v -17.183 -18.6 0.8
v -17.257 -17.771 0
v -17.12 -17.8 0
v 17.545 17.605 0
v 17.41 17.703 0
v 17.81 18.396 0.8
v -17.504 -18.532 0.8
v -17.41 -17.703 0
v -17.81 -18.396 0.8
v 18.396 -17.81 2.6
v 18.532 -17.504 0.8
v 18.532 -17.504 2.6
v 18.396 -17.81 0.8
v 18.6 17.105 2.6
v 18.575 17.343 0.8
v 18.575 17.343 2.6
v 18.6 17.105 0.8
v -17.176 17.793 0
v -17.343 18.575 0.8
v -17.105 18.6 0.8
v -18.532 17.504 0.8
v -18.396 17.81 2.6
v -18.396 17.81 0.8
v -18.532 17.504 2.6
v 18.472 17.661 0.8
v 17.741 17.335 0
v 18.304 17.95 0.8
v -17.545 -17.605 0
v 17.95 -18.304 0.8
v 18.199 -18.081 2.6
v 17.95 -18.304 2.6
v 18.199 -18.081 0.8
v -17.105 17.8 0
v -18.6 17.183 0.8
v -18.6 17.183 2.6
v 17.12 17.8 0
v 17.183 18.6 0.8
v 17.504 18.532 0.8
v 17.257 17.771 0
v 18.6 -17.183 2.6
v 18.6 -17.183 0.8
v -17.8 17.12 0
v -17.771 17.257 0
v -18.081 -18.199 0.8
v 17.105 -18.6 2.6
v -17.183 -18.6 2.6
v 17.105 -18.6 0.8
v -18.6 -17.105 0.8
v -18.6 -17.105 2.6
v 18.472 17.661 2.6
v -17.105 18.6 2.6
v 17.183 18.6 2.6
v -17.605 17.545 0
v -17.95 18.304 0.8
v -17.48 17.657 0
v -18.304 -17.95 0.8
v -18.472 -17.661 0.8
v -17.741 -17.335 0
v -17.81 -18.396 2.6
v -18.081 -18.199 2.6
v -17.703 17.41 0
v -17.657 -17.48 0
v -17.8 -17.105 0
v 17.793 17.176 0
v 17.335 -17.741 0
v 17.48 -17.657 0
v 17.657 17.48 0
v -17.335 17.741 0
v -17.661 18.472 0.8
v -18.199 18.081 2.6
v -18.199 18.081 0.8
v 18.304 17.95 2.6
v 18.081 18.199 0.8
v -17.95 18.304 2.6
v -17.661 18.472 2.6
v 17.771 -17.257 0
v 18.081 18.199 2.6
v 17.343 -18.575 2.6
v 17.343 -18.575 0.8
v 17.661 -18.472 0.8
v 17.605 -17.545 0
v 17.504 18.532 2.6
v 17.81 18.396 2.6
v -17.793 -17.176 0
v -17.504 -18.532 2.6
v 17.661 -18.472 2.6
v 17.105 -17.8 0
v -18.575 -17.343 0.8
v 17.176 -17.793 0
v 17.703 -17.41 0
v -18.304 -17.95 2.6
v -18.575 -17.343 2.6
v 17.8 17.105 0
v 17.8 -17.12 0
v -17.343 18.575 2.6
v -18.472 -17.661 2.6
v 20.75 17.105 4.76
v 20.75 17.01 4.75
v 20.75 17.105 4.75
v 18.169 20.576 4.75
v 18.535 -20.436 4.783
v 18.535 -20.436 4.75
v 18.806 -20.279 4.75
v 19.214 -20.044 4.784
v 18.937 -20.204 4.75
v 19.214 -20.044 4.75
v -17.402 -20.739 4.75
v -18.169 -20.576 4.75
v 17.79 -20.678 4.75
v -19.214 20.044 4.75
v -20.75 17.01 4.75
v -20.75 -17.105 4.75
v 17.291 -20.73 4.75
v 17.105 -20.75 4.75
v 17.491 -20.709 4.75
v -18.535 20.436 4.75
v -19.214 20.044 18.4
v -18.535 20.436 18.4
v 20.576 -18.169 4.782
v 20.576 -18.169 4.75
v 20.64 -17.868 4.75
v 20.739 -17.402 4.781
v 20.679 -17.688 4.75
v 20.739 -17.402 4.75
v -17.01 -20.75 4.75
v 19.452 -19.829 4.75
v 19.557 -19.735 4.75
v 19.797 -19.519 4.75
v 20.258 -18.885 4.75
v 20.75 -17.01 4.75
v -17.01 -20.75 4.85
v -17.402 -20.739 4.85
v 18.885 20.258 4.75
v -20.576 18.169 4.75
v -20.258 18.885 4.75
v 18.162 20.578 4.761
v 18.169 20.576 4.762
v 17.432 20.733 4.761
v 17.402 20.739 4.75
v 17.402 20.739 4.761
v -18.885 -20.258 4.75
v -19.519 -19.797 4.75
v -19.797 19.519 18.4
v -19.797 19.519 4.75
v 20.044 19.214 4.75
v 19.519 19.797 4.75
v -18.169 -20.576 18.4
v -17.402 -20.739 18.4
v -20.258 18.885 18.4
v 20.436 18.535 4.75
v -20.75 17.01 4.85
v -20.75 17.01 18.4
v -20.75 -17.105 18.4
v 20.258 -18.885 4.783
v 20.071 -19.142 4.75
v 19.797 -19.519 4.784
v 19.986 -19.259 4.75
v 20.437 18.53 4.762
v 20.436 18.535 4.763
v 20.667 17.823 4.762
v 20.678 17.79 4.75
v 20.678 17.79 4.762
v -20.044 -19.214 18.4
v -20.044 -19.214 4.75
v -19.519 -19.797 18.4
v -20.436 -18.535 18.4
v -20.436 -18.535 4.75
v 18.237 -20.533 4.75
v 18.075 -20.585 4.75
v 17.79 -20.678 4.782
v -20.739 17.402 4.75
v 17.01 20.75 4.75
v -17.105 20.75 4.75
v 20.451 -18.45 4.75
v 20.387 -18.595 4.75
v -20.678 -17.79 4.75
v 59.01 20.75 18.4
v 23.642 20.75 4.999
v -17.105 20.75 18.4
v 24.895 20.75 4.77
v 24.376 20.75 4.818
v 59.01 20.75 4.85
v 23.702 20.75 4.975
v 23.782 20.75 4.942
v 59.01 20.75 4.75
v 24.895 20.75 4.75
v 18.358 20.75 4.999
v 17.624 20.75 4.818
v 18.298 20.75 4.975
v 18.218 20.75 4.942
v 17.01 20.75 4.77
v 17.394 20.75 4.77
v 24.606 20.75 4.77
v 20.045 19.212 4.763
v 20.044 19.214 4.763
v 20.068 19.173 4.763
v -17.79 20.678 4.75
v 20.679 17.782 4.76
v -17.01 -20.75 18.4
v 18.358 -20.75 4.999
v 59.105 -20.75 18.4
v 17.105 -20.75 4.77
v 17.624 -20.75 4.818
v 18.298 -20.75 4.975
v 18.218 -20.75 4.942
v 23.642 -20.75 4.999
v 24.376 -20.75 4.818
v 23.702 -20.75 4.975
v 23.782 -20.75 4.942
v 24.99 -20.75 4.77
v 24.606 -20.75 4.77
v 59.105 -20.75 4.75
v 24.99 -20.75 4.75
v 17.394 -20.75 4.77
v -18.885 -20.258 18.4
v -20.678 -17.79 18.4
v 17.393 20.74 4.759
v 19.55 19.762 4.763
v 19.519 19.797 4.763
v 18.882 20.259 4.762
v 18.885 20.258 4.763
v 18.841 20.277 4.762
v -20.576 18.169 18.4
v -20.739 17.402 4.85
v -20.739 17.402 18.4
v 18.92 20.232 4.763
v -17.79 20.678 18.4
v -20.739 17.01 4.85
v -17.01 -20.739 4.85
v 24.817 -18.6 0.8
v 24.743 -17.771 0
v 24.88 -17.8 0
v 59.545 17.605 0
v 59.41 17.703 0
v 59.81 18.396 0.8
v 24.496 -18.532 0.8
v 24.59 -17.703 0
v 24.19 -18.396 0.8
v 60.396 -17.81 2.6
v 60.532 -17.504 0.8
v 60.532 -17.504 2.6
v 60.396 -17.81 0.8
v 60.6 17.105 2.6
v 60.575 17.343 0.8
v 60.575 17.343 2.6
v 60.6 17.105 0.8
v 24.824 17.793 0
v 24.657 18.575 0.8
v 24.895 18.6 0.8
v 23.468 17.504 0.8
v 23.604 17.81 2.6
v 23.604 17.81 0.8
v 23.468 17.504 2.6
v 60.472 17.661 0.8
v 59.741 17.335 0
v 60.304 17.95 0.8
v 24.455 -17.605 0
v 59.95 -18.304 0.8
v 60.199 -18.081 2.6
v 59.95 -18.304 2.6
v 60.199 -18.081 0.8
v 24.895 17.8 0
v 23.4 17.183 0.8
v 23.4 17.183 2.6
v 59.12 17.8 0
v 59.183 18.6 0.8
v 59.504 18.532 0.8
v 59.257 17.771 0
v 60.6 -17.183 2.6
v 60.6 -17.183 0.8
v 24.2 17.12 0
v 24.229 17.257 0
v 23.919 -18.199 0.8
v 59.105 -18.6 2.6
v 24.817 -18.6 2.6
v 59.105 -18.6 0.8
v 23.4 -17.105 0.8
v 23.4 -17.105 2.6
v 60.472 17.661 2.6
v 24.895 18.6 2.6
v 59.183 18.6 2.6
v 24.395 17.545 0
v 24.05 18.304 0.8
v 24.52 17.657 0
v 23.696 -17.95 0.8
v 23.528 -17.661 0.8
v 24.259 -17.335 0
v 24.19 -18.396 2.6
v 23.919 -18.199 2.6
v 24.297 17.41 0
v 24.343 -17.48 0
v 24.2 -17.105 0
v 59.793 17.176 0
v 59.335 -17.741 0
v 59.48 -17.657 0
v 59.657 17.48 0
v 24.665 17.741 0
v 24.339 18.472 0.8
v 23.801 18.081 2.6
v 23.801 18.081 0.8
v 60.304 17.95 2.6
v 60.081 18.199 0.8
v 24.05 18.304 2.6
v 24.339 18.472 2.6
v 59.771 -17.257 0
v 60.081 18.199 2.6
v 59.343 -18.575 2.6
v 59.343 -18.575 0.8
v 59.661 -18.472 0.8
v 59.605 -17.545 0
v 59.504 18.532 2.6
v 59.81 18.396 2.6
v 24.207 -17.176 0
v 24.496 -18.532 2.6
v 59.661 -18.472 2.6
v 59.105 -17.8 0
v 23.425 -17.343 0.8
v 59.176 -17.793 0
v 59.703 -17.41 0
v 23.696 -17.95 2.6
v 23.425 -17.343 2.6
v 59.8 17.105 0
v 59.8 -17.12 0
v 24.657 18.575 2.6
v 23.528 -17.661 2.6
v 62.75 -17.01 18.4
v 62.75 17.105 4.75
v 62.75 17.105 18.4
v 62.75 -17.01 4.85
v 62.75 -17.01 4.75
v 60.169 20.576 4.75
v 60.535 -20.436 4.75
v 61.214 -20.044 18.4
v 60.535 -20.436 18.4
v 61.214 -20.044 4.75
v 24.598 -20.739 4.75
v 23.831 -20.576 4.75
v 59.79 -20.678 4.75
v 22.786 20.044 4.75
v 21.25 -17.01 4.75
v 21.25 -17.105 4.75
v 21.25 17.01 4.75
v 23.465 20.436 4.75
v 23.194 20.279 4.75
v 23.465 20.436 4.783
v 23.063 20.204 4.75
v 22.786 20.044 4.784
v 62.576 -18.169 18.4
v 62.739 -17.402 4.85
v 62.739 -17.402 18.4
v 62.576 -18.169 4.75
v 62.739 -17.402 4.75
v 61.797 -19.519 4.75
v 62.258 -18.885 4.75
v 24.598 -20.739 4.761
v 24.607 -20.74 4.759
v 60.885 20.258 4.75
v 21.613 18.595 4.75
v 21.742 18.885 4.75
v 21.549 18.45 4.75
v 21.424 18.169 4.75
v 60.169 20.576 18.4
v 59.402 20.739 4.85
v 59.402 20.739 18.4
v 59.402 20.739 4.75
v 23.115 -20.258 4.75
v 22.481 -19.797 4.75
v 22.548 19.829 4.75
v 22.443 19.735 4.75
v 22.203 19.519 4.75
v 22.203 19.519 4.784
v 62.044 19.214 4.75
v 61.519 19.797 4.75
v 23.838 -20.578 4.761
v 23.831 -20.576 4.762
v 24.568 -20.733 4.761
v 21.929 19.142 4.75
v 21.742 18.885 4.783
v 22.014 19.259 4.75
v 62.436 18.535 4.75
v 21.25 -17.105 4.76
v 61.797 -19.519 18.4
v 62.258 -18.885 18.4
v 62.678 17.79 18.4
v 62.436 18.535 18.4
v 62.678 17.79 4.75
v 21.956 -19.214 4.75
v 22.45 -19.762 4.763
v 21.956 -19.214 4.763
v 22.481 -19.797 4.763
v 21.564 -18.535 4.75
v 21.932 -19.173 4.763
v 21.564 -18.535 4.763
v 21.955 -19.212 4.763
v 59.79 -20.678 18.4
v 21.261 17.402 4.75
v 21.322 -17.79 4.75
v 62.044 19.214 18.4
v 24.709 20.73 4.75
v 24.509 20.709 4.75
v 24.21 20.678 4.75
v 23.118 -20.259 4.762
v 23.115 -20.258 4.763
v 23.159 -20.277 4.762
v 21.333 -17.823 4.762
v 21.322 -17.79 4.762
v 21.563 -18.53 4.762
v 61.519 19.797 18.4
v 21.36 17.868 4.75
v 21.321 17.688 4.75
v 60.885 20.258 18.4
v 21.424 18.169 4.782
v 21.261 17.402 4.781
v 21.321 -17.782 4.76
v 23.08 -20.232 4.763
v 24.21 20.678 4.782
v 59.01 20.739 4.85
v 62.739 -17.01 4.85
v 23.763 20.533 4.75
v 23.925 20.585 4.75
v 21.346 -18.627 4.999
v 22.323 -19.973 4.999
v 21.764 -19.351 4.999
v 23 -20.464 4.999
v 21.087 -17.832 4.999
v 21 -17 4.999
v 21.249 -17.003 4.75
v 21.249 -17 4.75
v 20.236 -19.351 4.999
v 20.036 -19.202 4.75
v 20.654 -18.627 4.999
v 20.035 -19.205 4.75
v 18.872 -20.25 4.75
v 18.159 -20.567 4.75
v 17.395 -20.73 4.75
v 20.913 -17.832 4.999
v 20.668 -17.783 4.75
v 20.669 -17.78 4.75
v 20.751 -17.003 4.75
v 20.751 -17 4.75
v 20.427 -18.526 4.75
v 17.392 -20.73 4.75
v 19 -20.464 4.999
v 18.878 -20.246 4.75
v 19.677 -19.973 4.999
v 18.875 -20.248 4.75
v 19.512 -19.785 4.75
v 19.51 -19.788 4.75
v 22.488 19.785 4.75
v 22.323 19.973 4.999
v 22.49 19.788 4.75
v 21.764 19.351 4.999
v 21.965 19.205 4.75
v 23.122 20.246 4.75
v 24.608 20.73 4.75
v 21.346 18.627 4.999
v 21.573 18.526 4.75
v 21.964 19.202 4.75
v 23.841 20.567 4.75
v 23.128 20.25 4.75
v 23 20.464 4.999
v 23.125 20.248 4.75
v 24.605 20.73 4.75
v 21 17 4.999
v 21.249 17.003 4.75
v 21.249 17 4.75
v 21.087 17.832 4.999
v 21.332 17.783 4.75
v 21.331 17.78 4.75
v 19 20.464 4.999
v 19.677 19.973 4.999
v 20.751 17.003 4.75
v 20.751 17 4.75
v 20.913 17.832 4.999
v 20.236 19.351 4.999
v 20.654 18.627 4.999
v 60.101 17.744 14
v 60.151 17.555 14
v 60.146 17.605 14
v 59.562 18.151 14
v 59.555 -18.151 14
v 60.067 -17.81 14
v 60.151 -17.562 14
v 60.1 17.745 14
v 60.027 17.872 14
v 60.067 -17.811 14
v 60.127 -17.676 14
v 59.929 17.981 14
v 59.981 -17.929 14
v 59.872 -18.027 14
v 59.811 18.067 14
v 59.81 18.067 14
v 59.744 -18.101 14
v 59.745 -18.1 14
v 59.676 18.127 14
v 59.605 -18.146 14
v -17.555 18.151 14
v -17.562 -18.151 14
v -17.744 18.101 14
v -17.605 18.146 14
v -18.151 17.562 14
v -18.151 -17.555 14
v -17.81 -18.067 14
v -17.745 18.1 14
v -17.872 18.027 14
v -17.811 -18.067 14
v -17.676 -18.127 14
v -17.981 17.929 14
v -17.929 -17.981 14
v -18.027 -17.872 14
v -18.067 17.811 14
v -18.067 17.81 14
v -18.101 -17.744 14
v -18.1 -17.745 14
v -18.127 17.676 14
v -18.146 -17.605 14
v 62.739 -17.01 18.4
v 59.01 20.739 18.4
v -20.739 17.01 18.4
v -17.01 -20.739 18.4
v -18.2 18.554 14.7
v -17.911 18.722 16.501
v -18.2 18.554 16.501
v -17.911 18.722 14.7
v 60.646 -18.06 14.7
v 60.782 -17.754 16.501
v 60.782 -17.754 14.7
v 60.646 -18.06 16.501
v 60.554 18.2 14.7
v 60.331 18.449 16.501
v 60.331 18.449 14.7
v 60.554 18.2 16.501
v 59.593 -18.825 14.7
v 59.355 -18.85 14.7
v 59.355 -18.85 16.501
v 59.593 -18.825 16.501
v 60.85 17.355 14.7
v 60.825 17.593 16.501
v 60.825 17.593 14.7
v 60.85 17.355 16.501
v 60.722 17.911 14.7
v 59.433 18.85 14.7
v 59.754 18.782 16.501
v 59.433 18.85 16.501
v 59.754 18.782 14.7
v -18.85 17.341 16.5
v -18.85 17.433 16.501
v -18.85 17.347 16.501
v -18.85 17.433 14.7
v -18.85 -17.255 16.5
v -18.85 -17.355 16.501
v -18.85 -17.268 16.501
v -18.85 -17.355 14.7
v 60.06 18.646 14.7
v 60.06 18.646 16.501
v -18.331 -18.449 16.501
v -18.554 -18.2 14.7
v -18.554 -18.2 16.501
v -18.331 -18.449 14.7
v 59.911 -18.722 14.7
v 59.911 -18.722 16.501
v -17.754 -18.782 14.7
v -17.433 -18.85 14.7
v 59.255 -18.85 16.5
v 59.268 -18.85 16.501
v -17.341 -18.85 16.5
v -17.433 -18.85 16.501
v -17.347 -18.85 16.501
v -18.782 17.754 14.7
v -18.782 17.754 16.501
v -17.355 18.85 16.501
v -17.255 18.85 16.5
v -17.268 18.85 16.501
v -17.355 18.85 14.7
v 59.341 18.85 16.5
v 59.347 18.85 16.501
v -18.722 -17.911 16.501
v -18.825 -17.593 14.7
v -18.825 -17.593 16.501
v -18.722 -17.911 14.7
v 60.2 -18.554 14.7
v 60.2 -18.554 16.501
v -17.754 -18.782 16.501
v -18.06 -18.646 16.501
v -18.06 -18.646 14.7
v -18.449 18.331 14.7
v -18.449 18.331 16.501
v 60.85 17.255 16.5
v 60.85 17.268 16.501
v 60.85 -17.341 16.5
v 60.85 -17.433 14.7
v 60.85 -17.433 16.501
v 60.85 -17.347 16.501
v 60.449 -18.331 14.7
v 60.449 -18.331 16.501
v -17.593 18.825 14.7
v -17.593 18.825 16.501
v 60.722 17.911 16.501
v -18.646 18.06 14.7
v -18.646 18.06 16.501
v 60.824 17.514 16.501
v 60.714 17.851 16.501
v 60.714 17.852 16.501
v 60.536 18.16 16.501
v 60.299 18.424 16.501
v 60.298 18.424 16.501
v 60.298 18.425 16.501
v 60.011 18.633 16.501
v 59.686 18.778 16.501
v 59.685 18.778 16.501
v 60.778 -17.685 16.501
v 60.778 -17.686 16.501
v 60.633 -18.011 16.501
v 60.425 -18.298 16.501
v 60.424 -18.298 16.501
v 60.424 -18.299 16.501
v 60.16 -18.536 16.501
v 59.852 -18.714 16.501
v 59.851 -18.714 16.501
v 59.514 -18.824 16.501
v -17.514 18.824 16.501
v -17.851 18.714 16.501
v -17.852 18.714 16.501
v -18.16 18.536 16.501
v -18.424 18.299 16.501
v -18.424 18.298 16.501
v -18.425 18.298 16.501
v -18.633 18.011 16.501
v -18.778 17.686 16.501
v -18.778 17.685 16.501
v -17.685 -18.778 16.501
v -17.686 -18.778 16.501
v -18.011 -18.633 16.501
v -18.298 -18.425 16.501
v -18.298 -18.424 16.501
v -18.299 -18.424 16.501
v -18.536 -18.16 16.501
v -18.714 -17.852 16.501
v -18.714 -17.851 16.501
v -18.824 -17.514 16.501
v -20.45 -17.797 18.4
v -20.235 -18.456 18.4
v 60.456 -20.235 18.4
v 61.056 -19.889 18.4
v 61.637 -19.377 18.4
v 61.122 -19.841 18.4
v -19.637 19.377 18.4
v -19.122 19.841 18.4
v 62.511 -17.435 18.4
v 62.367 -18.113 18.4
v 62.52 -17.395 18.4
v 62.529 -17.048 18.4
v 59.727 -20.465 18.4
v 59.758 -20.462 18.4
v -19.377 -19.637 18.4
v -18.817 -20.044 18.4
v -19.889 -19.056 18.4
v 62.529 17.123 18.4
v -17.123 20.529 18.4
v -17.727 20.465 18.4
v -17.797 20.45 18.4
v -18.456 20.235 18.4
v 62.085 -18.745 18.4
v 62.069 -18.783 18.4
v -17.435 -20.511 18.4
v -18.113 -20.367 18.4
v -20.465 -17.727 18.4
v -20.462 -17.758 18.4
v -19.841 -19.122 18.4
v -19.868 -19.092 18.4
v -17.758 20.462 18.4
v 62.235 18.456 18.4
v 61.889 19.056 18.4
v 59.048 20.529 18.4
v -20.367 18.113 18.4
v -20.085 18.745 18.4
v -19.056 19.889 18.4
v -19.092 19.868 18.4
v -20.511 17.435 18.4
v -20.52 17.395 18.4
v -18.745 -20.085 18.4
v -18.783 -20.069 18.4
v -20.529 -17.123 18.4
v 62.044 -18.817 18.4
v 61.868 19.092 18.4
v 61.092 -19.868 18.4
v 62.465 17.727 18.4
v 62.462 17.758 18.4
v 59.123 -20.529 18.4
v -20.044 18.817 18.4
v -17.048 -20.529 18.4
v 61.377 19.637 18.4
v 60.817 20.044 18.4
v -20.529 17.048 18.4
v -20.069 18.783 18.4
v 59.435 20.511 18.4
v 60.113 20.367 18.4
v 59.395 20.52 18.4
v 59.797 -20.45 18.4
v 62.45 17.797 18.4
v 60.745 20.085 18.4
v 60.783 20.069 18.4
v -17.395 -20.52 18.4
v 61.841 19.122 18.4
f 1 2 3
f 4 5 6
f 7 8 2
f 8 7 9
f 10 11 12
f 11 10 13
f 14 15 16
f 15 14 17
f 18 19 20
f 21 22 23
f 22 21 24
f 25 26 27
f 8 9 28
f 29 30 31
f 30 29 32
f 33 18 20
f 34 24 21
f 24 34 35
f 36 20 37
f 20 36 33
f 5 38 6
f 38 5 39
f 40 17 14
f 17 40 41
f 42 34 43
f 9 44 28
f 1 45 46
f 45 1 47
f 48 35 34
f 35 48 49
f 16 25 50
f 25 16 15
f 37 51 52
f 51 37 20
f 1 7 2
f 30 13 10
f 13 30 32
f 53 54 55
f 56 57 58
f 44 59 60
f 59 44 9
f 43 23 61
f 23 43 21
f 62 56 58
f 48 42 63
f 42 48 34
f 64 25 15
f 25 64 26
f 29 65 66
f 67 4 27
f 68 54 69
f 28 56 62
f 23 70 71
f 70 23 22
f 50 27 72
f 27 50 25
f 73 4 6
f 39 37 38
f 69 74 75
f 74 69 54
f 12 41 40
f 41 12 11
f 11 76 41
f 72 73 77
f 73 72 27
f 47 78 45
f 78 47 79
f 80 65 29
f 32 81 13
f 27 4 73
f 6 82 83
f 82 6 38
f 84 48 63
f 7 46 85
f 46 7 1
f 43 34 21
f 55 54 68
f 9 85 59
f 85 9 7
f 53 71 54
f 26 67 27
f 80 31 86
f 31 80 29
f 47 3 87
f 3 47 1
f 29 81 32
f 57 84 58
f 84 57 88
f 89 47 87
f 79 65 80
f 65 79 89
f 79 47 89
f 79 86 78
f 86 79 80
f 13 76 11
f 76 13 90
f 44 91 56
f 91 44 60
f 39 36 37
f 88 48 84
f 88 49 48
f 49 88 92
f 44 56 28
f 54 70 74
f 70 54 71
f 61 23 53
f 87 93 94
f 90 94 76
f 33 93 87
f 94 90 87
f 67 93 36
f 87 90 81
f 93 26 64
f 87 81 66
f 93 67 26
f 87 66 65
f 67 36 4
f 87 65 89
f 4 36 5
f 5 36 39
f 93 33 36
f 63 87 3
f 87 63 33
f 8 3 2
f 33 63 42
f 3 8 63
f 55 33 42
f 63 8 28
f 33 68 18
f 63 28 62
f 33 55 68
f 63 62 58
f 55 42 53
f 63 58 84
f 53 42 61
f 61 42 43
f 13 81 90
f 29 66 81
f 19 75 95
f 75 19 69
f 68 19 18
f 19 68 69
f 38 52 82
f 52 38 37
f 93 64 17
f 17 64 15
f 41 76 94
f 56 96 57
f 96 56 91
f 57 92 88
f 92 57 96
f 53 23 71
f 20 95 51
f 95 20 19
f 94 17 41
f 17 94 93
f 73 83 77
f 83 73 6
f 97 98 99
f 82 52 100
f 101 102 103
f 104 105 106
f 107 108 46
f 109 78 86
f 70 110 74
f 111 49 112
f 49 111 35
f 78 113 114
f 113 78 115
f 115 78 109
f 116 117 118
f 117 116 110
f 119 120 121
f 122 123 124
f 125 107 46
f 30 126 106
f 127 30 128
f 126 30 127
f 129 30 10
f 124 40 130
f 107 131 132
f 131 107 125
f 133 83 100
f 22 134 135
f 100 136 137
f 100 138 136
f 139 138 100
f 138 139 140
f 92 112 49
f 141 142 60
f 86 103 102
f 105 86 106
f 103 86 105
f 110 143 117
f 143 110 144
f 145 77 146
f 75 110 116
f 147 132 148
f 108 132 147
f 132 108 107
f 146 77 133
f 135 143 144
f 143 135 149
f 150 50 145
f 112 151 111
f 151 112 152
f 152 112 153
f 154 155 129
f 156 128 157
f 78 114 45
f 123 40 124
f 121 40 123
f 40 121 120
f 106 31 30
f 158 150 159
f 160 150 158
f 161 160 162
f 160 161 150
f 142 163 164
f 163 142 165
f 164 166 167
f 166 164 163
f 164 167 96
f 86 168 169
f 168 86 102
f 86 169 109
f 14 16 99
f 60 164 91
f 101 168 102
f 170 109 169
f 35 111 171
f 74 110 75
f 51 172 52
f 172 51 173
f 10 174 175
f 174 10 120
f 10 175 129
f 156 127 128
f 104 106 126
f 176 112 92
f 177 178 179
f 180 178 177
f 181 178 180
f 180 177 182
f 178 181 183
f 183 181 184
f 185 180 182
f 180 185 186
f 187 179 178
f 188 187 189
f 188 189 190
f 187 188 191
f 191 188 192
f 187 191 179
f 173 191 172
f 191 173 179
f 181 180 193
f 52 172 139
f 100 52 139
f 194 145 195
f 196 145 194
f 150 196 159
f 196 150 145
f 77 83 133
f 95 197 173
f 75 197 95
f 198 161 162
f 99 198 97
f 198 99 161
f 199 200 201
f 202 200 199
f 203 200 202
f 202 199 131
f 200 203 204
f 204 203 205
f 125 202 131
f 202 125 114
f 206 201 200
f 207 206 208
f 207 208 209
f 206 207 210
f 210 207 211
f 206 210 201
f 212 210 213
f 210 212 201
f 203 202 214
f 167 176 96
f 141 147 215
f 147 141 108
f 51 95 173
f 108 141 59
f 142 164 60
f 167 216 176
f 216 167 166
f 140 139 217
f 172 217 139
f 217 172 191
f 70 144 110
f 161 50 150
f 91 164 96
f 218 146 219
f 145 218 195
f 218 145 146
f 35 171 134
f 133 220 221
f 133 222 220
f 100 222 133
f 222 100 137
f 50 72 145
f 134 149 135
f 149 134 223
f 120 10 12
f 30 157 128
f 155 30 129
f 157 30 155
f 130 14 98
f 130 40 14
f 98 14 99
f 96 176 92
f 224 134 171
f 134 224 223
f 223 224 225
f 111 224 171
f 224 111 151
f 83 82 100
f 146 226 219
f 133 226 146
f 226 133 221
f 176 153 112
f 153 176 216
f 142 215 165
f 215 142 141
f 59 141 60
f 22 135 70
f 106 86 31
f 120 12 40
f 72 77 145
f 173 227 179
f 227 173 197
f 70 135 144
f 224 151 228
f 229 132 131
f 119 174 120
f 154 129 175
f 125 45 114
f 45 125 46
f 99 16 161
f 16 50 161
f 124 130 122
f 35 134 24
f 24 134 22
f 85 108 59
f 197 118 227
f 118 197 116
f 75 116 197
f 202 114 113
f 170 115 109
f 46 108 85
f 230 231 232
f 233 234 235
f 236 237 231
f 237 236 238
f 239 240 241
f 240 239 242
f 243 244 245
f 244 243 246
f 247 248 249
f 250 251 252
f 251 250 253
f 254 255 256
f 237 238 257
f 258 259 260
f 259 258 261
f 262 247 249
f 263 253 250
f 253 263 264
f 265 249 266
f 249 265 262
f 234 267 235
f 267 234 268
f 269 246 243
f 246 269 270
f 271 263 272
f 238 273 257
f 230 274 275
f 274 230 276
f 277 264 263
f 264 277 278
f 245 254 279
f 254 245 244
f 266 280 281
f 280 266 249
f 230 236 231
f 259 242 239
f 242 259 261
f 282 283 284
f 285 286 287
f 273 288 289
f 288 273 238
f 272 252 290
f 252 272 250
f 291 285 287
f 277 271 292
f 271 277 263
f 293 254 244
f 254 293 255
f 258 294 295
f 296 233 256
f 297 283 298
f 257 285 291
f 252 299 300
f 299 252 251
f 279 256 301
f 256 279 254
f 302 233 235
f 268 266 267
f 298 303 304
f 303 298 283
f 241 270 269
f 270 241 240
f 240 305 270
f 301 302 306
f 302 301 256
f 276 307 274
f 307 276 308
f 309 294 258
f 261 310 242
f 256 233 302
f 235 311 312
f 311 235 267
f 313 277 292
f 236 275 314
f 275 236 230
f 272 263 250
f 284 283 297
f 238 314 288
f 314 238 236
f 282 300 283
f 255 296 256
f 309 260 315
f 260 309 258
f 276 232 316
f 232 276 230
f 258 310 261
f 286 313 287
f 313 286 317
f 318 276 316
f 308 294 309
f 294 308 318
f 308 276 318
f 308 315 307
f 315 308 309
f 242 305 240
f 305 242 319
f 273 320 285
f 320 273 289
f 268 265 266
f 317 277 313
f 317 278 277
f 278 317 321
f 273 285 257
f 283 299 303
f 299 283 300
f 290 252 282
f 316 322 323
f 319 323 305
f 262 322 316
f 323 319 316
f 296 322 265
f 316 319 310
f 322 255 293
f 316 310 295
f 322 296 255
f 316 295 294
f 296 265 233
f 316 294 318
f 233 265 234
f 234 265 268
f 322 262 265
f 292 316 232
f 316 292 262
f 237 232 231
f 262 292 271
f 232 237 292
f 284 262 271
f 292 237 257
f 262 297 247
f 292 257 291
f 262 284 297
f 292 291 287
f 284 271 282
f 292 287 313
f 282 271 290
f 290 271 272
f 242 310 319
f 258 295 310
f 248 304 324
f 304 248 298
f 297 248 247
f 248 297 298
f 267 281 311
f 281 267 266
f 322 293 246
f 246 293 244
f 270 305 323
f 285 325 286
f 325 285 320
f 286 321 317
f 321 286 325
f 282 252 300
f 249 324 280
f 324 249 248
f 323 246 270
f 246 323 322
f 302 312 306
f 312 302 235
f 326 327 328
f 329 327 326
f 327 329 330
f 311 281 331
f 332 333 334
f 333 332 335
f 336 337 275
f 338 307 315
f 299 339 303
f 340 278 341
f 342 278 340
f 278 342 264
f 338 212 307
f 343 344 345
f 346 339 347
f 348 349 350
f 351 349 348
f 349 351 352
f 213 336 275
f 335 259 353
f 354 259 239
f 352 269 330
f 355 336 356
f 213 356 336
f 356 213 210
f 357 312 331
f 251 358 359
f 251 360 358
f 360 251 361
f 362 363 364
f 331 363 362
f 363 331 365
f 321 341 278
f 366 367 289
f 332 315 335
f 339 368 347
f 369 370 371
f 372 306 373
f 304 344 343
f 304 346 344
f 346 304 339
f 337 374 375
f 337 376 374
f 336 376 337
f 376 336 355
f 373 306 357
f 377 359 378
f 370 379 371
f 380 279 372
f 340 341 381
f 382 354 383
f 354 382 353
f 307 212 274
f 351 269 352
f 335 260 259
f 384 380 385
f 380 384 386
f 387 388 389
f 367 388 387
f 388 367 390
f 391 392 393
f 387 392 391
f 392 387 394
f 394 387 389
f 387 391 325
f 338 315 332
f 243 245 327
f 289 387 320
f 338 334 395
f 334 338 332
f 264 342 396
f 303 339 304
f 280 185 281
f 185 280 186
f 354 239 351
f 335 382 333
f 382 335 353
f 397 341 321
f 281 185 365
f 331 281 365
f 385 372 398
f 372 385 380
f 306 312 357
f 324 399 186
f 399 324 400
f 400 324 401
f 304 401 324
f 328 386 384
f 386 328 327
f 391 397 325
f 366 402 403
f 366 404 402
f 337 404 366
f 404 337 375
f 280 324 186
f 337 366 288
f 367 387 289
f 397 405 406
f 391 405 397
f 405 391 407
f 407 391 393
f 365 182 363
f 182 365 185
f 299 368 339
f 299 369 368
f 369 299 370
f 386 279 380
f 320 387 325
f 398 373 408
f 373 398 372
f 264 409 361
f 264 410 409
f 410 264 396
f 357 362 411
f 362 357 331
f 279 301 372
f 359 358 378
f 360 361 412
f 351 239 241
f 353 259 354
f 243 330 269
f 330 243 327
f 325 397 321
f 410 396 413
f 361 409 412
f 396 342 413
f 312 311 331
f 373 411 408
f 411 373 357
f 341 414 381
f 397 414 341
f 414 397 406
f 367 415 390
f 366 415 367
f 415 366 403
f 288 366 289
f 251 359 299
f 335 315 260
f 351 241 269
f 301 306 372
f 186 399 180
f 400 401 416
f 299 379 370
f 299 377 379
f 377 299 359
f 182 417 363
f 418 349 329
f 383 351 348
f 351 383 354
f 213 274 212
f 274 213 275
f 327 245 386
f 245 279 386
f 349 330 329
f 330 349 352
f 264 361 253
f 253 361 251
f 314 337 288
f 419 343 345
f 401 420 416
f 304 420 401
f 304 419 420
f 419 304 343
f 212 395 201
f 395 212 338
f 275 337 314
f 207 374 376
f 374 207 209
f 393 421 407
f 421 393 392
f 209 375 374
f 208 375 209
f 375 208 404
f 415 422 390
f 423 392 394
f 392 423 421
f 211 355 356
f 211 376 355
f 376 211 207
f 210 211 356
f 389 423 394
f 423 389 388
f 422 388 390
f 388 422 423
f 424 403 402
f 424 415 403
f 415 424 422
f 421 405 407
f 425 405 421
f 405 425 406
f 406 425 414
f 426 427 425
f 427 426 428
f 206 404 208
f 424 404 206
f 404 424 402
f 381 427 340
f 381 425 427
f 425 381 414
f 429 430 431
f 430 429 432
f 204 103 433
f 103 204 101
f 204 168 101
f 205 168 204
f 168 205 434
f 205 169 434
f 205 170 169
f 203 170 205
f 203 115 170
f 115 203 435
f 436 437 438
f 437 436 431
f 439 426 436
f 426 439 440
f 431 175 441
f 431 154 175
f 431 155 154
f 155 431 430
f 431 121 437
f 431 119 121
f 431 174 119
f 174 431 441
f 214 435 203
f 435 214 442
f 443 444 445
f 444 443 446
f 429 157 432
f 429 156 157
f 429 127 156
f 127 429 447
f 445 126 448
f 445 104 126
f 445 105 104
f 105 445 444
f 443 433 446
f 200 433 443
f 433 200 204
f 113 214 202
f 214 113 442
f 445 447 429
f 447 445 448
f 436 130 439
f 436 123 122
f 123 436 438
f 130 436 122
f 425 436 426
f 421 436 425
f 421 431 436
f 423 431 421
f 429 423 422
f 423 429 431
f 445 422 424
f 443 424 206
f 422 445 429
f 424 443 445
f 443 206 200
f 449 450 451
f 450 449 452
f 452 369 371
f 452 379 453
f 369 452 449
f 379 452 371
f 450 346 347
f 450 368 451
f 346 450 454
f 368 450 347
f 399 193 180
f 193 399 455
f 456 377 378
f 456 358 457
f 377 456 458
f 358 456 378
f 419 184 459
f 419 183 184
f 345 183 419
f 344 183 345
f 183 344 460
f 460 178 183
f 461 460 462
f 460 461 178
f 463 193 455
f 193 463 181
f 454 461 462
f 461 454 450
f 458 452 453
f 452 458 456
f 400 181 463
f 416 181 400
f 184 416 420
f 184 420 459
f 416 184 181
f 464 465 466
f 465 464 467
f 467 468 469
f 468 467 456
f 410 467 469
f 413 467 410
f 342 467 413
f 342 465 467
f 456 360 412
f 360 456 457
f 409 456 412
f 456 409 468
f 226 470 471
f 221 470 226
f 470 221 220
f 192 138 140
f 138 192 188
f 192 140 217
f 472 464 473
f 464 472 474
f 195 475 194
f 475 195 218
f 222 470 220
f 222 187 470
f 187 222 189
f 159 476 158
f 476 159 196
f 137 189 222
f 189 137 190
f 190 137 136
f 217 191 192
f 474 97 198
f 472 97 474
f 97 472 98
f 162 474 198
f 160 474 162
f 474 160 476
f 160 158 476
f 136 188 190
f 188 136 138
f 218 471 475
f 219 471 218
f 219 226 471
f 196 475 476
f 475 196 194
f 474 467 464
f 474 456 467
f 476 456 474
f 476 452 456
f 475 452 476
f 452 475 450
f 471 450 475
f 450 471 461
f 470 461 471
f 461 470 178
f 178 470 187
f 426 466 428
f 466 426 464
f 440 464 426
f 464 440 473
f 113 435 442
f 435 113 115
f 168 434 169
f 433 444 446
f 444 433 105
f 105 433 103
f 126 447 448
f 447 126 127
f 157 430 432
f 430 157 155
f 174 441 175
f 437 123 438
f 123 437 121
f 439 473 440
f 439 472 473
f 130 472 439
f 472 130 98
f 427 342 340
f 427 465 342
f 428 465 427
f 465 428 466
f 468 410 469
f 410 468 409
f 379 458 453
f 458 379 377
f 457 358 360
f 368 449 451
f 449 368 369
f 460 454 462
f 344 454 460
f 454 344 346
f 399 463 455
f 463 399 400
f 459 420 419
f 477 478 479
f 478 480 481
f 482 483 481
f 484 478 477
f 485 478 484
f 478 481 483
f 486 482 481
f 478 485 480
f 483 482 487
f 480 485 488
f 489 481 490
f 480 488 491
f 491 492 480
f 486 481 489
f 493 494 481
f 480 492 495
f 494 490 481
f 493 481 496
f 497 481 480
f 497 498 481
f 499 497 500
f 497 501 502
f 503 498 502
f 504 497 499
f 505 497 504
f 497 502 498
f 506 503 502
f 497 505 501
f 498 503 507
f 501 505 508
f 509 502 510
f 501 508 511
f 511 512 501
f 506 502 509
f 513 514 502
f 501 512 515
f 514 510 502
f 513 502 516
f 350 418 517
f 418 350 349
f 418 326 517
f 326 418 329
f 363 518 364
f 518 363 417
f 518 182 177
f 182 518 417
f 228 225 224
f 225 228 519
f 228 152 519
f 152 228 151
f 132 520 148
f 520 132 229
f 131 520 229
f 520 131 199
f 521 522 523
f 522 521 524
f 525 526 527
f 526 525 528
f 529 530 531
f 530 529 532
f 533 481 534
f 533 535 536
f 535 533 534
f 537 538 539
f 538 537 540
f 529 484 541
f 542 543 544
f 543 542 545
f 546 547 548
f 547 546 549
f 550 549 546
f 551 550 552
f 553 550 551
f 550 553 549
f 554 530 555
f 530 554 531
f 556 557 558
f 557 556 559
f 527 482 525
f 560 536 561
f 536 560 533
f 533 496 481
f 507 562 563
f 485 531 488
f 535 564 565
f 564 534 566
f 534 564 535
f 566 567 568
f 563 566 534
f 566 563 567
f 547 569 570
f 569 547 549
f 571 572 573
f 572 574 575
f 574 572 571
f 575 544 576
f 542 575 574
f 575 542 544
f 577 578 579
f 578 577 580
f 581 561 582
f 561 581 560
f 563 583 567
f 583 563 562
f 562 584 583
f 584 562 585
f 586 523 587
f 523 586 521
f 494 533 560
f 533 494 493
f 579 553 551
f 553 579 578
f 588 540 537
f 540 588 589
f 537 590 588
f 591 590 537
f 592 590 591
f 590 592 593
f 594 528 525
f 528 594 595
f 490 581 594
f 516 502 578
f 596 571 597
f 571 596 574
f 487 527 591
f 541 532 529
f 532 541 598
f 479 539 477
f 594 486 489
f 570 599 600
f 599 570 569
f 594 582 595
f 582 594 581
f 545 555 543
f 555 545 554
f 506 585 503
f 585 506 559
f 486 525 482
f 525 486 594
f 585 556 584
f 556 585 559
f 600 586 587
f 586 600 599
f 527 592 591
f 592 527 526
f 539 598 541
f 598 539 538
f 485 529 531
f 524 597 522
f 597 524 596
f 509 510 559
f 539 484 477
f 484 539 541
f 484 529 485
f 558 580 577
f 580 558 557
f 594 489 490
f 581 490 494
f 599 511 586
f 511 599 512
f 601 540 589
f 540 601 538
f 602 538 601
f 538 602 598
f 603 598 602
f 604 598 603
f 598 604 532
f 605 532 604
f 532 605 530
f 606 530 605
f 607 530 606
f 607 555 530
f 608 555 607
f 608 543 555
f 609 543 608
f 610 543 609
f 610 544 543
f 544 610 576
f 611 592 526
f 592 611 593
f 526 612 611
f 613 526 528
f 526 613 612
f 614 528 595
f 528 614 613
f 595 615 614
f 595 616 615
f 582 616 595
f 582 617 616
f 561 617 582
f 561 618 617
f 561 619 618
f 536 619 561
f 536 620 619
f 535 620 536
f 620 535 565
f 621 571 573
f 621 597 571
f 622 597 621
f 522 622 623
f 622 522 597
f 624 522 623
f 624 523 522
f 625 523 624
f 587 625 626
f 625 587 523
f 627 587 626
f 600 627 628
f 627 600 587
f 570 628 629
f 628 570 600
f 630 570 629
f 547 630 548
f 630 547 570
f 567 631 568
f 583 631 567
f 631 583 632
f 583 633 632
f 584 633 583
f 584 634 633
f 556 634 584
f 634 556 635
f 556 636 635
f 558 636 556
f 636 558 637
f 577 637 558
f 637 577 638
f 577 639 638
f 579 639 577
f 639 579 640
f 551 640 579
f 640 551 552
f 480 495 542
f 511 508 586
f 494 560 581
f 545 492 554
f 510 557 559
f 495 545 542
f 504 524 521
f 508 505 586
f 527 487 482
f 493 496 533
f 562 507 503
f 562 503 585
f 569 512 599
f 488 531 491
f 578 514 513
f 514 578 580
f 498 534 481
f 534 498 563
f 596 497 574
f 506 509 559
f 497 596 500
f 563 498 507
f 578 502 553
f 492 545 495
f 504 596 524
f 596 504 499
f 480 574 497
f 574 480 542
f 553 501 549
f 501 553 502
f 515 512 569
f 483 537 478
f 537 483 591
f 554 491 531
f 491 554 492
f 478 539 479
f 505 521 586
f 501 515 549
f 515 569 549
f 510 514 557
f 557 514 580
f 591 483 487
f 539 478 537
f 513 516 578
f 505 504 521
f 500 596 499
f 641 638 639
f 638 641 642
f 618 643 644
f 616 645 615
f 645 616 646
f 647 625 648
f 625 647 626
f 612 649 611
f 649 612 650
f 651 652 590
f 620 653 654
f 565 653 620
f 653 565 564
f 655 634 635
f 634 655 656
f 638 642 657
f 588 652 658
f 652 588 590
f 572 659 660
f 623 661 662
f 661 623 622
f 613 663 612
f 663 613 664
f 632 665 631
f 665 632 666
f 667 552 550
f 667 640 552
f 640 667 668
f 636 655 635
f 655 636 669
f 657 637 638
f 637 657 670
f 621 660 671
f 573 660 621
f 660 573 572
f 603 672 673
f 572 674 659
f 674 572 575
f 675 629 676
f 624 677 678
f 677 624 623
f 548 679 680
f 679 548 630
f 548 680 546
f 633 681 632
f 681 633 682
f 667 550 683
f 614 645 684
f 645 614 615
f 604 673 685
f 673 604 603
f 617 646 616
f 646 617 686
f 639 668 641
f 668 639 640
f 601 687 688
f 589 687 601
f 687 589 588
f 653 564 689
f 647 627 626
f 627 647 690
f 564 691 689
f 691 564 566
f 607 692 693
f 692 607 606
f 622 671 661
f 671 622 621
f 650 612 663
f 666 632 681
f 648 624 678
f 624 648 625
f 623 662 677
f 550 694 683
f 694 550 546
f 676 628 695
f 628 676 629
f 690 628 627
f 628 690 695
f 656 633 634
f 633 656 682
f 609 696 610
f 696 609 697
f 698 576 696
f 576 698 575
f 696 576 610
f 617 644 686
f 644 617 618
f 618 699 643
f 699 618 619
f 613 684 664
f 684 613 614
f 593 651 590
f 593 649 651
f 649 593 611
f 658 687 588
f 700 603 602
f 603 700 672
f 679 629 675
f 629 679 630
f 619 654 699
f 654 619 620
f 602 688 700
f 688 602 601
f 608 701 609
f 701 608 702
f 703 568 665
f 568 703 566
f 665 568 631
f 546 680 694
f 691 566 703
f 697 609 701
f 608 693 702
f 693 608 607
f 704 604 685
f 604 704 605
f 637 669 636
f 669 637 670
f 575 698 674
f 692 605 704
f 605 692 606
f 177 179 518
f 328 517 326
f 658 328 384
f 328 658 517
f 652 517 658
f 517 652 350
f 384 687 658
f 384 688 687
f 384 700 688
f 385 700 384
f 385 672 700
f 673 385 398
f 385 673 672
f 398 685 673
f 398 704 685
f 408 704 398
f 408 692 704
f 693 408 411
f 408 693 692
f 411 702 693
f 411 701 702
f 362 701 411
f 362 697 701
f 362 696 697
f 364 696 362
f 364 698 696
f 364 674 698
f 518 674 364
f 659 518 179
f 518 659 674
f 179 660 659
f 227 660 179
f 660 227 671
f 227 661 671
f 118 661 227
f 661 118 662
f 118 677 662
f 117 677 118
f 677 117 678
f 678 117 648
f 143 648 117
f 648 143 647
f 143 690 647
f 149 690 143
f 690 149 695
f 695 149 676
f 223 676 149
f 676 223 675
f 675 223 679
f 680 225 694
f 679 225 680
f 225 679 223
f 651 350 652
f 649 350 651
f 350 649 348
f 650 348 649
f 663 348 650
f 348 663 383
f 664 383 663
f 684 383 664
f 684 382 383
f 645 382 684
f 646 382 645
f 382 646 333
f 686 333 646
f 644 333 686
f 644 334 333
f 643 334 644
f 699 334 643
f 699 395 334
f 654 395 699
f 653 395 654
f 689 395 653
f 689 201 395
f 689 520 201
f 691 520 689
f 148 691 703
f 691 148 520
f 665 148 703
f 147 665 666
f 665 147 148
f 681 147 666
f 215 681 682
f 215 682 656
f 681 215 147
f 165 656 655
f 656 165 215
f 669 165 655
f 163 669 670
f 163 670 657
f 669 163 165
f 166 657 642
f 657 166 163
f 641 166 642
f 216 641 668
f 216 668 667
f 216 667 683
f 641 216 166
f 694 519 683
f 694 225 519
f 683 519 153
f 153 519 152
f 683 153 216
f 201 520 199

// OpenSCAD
// file: gridfinity.scad
$fn = 30;

// https://gridfinity.xyz/specification/

height   = 7;
width    = 42;
width_tolerance    = 41.5;
rounding = 3.75;

module rounding(r,angle) {
  rotate(angle,[0,0,1])
  translate([-r + 0.01, -r + 0.01])
  difference() {
    square([r,r]);
    circle(r);
  }
}

module rounded_square(lx, ly, r) {
  difference() {
    square([lx,ly],center=true);
    union() {
      translate([ lx/2, ly/2]) rounding(r, 0  );
      translate([-lx/2, ly/2]) rounding(r, 90 );
      translate([-lx/2,-ly/2]) rounding(r, 180);
      translate([ lx/2,-ly/2]) rounding(r, 270);
    }
  }
}

module magnet_hole(h = 0) {
  linear_extrude(2.5) circle(3.25);
  translate([0,0,2.5]) linear_extrude(h) circle(1.5);
}

module base_solid() {
  hull() {
    linear_extrude(0.1)rounded_square(35.6, 35.6, 0.8);
    translate([0,0,0.8]) linear_extrude(1.8) rounded_square(37.2, 37.2, 1.6);
  }
  translate([0,0,2.6]) hull() {
    linear_extrude(0.1) rounded_square(37.2, 37.2, 1.6);
    translate([0,0,2.15]) linear_extrude(0.1)rounded_square(41.5, 41.5, 3.75);
  }
}

module base(magnets = false) {
  l = 35.6;
  o = 4.8;

  difference() {
    base_solid();
    if (magnets) union() {
      translate([ l/2 - o,  l/2 - o, -0.01]) magnet_hole();
      translate([-l/2 + o,  l/2 - o, -0.01]) magnet_hole();
      translate([ l/2 - o, -l/2 + o, -0.01]) magnet_hole();
      translate([-l/2 + o, -l/2 + o, -0.01]) magnet_hole();
    }
  }
}

module stacking_lip_negative(ux, uy) {
  x1 = (width * ux) -5.2 -0.5;
  y1 = (width * uy) -5.2 -0.5;
  x2 = (width * ux) -3.8 -0.5;
  y2 = (width * uy) -3.8 -0.5;
  x3 = (width * ux) -0.5;
  y3 = (width * uy) -0.5;

  // translate and scale are here to make sure the negative pokes through
  // the positive block
  translate([0,0,-0.001]) scale([1,1,1.001]) hull() {
    linear_extrude(0.01)rounded_square(x1, y1, 0.7);
    translate([0,0,0.7]) linear_extrude(1.8) rounded_square(x2, y2, 1.6);
  }
  translate([0,0,2.5]) hull() {
    linear_extrude(0.01) rounded_square(x2, y2, 1.7);
    translate([0,0,2.15]) linear_extrude(0.01)rounded_square(x3, y3, 3.75);
  }
}

function coord_centered(ux) = (ux -1) * width - 0.5 * width * (ux - 1);

module stacking_lip(units_x, units_y) {
  difference() {
    linear_extrude(4.4)rounded_square(units_x * width -0.5, units_y * width -0.5, rounding);
    stacking_lip_negative(units_x, units_y);
  }
}

module cutout_slot(l, rx = 0) {
  rotate([rx,-90,0]) linear_extrude(l) polygon([[0,-0.25],[0,0.25],[0.25,0]]);
}

// Cut out a cross with edges sloped like the rounded corners of the base
module cutout_cross() {
    r = rounding + 0.25;

    difference() {
      linear_extrude(0.25) square([r * 2, r * 2], center=true);
      union() {
        for(c = [[r,r], [r,-r], [-r,r], [-r,-r]]) translate(c) hull() {
          linear_extrude(0.01) circle(rounding);
          translate([0,0,0.25]) linear_extrude(0.01) circle(rounding + 0.25);
        }
      }
    }
}

module bottom_cutout(units_x, units_y) {
  if (units_y > 1) for (i = [1:units_y - 1]) {
    translate([units_x * width - width/2, i * width - width/2, 4.749])
      cutout_slot(width * units_x);
  }
  if(units_x > 1) for (i = [1:units_x - 1]) {
    translate([i * width - width/2, units_y * width - width/2, 4.749])
      cutout_slot(width * units_y, rx=90);
  }

  for (ux = [0:units_x]) {
    for (uy = [0:units_y]) {
      // we don't need the cross in the corners
      if (!( (ux == 0       && uy == 0      ) ||
             (ux == units_x && uy == units_y) ||
             (ux == 0       && uy == units_y) ||
             (ux == units_x && uy == 0      ) ))
        translate([ux * width - width/2, uy * width - width/2, 4.749]) cutout_cross();
    }
  }
}

module gridfinity(units_x, units_y, units_z, lip = true, magnets = false) {
  // Bases
  for (ux = [0:units_x -1]) {
    for (uy = [0:units_y -1]) {
      translate([ux * width, uy * width,0]) base(magnets = magnets);
    }
  }

  // Solid Block
  if (units_z > 0) {
    difference() {
      translate([coord_centered(units_x), coord_centered(units_y), 4.75]) {
        extr = units_z * height - 4.75;
        linear_extrude(extr)
          rounded_square(units_x * width - 0.5, units_y * width - 0.5, rounding);
      }
      bottom_cutout(units_x, units_y);
    }
  }

  // Stacking Lip
  if (lip && units_z > 0) // Just to safeguard. h=0 is not intended to be used with lip.
    translate([coord_centered(units_x), coord_centered(units_y), units_z * height])
      stacking_lip(units_x, units_y);
}
// main file
use <gridfinity.scad>

gridfinity(2, 1, 2, lip=true, magnets=false, fill = false, bottom_height = 0);
